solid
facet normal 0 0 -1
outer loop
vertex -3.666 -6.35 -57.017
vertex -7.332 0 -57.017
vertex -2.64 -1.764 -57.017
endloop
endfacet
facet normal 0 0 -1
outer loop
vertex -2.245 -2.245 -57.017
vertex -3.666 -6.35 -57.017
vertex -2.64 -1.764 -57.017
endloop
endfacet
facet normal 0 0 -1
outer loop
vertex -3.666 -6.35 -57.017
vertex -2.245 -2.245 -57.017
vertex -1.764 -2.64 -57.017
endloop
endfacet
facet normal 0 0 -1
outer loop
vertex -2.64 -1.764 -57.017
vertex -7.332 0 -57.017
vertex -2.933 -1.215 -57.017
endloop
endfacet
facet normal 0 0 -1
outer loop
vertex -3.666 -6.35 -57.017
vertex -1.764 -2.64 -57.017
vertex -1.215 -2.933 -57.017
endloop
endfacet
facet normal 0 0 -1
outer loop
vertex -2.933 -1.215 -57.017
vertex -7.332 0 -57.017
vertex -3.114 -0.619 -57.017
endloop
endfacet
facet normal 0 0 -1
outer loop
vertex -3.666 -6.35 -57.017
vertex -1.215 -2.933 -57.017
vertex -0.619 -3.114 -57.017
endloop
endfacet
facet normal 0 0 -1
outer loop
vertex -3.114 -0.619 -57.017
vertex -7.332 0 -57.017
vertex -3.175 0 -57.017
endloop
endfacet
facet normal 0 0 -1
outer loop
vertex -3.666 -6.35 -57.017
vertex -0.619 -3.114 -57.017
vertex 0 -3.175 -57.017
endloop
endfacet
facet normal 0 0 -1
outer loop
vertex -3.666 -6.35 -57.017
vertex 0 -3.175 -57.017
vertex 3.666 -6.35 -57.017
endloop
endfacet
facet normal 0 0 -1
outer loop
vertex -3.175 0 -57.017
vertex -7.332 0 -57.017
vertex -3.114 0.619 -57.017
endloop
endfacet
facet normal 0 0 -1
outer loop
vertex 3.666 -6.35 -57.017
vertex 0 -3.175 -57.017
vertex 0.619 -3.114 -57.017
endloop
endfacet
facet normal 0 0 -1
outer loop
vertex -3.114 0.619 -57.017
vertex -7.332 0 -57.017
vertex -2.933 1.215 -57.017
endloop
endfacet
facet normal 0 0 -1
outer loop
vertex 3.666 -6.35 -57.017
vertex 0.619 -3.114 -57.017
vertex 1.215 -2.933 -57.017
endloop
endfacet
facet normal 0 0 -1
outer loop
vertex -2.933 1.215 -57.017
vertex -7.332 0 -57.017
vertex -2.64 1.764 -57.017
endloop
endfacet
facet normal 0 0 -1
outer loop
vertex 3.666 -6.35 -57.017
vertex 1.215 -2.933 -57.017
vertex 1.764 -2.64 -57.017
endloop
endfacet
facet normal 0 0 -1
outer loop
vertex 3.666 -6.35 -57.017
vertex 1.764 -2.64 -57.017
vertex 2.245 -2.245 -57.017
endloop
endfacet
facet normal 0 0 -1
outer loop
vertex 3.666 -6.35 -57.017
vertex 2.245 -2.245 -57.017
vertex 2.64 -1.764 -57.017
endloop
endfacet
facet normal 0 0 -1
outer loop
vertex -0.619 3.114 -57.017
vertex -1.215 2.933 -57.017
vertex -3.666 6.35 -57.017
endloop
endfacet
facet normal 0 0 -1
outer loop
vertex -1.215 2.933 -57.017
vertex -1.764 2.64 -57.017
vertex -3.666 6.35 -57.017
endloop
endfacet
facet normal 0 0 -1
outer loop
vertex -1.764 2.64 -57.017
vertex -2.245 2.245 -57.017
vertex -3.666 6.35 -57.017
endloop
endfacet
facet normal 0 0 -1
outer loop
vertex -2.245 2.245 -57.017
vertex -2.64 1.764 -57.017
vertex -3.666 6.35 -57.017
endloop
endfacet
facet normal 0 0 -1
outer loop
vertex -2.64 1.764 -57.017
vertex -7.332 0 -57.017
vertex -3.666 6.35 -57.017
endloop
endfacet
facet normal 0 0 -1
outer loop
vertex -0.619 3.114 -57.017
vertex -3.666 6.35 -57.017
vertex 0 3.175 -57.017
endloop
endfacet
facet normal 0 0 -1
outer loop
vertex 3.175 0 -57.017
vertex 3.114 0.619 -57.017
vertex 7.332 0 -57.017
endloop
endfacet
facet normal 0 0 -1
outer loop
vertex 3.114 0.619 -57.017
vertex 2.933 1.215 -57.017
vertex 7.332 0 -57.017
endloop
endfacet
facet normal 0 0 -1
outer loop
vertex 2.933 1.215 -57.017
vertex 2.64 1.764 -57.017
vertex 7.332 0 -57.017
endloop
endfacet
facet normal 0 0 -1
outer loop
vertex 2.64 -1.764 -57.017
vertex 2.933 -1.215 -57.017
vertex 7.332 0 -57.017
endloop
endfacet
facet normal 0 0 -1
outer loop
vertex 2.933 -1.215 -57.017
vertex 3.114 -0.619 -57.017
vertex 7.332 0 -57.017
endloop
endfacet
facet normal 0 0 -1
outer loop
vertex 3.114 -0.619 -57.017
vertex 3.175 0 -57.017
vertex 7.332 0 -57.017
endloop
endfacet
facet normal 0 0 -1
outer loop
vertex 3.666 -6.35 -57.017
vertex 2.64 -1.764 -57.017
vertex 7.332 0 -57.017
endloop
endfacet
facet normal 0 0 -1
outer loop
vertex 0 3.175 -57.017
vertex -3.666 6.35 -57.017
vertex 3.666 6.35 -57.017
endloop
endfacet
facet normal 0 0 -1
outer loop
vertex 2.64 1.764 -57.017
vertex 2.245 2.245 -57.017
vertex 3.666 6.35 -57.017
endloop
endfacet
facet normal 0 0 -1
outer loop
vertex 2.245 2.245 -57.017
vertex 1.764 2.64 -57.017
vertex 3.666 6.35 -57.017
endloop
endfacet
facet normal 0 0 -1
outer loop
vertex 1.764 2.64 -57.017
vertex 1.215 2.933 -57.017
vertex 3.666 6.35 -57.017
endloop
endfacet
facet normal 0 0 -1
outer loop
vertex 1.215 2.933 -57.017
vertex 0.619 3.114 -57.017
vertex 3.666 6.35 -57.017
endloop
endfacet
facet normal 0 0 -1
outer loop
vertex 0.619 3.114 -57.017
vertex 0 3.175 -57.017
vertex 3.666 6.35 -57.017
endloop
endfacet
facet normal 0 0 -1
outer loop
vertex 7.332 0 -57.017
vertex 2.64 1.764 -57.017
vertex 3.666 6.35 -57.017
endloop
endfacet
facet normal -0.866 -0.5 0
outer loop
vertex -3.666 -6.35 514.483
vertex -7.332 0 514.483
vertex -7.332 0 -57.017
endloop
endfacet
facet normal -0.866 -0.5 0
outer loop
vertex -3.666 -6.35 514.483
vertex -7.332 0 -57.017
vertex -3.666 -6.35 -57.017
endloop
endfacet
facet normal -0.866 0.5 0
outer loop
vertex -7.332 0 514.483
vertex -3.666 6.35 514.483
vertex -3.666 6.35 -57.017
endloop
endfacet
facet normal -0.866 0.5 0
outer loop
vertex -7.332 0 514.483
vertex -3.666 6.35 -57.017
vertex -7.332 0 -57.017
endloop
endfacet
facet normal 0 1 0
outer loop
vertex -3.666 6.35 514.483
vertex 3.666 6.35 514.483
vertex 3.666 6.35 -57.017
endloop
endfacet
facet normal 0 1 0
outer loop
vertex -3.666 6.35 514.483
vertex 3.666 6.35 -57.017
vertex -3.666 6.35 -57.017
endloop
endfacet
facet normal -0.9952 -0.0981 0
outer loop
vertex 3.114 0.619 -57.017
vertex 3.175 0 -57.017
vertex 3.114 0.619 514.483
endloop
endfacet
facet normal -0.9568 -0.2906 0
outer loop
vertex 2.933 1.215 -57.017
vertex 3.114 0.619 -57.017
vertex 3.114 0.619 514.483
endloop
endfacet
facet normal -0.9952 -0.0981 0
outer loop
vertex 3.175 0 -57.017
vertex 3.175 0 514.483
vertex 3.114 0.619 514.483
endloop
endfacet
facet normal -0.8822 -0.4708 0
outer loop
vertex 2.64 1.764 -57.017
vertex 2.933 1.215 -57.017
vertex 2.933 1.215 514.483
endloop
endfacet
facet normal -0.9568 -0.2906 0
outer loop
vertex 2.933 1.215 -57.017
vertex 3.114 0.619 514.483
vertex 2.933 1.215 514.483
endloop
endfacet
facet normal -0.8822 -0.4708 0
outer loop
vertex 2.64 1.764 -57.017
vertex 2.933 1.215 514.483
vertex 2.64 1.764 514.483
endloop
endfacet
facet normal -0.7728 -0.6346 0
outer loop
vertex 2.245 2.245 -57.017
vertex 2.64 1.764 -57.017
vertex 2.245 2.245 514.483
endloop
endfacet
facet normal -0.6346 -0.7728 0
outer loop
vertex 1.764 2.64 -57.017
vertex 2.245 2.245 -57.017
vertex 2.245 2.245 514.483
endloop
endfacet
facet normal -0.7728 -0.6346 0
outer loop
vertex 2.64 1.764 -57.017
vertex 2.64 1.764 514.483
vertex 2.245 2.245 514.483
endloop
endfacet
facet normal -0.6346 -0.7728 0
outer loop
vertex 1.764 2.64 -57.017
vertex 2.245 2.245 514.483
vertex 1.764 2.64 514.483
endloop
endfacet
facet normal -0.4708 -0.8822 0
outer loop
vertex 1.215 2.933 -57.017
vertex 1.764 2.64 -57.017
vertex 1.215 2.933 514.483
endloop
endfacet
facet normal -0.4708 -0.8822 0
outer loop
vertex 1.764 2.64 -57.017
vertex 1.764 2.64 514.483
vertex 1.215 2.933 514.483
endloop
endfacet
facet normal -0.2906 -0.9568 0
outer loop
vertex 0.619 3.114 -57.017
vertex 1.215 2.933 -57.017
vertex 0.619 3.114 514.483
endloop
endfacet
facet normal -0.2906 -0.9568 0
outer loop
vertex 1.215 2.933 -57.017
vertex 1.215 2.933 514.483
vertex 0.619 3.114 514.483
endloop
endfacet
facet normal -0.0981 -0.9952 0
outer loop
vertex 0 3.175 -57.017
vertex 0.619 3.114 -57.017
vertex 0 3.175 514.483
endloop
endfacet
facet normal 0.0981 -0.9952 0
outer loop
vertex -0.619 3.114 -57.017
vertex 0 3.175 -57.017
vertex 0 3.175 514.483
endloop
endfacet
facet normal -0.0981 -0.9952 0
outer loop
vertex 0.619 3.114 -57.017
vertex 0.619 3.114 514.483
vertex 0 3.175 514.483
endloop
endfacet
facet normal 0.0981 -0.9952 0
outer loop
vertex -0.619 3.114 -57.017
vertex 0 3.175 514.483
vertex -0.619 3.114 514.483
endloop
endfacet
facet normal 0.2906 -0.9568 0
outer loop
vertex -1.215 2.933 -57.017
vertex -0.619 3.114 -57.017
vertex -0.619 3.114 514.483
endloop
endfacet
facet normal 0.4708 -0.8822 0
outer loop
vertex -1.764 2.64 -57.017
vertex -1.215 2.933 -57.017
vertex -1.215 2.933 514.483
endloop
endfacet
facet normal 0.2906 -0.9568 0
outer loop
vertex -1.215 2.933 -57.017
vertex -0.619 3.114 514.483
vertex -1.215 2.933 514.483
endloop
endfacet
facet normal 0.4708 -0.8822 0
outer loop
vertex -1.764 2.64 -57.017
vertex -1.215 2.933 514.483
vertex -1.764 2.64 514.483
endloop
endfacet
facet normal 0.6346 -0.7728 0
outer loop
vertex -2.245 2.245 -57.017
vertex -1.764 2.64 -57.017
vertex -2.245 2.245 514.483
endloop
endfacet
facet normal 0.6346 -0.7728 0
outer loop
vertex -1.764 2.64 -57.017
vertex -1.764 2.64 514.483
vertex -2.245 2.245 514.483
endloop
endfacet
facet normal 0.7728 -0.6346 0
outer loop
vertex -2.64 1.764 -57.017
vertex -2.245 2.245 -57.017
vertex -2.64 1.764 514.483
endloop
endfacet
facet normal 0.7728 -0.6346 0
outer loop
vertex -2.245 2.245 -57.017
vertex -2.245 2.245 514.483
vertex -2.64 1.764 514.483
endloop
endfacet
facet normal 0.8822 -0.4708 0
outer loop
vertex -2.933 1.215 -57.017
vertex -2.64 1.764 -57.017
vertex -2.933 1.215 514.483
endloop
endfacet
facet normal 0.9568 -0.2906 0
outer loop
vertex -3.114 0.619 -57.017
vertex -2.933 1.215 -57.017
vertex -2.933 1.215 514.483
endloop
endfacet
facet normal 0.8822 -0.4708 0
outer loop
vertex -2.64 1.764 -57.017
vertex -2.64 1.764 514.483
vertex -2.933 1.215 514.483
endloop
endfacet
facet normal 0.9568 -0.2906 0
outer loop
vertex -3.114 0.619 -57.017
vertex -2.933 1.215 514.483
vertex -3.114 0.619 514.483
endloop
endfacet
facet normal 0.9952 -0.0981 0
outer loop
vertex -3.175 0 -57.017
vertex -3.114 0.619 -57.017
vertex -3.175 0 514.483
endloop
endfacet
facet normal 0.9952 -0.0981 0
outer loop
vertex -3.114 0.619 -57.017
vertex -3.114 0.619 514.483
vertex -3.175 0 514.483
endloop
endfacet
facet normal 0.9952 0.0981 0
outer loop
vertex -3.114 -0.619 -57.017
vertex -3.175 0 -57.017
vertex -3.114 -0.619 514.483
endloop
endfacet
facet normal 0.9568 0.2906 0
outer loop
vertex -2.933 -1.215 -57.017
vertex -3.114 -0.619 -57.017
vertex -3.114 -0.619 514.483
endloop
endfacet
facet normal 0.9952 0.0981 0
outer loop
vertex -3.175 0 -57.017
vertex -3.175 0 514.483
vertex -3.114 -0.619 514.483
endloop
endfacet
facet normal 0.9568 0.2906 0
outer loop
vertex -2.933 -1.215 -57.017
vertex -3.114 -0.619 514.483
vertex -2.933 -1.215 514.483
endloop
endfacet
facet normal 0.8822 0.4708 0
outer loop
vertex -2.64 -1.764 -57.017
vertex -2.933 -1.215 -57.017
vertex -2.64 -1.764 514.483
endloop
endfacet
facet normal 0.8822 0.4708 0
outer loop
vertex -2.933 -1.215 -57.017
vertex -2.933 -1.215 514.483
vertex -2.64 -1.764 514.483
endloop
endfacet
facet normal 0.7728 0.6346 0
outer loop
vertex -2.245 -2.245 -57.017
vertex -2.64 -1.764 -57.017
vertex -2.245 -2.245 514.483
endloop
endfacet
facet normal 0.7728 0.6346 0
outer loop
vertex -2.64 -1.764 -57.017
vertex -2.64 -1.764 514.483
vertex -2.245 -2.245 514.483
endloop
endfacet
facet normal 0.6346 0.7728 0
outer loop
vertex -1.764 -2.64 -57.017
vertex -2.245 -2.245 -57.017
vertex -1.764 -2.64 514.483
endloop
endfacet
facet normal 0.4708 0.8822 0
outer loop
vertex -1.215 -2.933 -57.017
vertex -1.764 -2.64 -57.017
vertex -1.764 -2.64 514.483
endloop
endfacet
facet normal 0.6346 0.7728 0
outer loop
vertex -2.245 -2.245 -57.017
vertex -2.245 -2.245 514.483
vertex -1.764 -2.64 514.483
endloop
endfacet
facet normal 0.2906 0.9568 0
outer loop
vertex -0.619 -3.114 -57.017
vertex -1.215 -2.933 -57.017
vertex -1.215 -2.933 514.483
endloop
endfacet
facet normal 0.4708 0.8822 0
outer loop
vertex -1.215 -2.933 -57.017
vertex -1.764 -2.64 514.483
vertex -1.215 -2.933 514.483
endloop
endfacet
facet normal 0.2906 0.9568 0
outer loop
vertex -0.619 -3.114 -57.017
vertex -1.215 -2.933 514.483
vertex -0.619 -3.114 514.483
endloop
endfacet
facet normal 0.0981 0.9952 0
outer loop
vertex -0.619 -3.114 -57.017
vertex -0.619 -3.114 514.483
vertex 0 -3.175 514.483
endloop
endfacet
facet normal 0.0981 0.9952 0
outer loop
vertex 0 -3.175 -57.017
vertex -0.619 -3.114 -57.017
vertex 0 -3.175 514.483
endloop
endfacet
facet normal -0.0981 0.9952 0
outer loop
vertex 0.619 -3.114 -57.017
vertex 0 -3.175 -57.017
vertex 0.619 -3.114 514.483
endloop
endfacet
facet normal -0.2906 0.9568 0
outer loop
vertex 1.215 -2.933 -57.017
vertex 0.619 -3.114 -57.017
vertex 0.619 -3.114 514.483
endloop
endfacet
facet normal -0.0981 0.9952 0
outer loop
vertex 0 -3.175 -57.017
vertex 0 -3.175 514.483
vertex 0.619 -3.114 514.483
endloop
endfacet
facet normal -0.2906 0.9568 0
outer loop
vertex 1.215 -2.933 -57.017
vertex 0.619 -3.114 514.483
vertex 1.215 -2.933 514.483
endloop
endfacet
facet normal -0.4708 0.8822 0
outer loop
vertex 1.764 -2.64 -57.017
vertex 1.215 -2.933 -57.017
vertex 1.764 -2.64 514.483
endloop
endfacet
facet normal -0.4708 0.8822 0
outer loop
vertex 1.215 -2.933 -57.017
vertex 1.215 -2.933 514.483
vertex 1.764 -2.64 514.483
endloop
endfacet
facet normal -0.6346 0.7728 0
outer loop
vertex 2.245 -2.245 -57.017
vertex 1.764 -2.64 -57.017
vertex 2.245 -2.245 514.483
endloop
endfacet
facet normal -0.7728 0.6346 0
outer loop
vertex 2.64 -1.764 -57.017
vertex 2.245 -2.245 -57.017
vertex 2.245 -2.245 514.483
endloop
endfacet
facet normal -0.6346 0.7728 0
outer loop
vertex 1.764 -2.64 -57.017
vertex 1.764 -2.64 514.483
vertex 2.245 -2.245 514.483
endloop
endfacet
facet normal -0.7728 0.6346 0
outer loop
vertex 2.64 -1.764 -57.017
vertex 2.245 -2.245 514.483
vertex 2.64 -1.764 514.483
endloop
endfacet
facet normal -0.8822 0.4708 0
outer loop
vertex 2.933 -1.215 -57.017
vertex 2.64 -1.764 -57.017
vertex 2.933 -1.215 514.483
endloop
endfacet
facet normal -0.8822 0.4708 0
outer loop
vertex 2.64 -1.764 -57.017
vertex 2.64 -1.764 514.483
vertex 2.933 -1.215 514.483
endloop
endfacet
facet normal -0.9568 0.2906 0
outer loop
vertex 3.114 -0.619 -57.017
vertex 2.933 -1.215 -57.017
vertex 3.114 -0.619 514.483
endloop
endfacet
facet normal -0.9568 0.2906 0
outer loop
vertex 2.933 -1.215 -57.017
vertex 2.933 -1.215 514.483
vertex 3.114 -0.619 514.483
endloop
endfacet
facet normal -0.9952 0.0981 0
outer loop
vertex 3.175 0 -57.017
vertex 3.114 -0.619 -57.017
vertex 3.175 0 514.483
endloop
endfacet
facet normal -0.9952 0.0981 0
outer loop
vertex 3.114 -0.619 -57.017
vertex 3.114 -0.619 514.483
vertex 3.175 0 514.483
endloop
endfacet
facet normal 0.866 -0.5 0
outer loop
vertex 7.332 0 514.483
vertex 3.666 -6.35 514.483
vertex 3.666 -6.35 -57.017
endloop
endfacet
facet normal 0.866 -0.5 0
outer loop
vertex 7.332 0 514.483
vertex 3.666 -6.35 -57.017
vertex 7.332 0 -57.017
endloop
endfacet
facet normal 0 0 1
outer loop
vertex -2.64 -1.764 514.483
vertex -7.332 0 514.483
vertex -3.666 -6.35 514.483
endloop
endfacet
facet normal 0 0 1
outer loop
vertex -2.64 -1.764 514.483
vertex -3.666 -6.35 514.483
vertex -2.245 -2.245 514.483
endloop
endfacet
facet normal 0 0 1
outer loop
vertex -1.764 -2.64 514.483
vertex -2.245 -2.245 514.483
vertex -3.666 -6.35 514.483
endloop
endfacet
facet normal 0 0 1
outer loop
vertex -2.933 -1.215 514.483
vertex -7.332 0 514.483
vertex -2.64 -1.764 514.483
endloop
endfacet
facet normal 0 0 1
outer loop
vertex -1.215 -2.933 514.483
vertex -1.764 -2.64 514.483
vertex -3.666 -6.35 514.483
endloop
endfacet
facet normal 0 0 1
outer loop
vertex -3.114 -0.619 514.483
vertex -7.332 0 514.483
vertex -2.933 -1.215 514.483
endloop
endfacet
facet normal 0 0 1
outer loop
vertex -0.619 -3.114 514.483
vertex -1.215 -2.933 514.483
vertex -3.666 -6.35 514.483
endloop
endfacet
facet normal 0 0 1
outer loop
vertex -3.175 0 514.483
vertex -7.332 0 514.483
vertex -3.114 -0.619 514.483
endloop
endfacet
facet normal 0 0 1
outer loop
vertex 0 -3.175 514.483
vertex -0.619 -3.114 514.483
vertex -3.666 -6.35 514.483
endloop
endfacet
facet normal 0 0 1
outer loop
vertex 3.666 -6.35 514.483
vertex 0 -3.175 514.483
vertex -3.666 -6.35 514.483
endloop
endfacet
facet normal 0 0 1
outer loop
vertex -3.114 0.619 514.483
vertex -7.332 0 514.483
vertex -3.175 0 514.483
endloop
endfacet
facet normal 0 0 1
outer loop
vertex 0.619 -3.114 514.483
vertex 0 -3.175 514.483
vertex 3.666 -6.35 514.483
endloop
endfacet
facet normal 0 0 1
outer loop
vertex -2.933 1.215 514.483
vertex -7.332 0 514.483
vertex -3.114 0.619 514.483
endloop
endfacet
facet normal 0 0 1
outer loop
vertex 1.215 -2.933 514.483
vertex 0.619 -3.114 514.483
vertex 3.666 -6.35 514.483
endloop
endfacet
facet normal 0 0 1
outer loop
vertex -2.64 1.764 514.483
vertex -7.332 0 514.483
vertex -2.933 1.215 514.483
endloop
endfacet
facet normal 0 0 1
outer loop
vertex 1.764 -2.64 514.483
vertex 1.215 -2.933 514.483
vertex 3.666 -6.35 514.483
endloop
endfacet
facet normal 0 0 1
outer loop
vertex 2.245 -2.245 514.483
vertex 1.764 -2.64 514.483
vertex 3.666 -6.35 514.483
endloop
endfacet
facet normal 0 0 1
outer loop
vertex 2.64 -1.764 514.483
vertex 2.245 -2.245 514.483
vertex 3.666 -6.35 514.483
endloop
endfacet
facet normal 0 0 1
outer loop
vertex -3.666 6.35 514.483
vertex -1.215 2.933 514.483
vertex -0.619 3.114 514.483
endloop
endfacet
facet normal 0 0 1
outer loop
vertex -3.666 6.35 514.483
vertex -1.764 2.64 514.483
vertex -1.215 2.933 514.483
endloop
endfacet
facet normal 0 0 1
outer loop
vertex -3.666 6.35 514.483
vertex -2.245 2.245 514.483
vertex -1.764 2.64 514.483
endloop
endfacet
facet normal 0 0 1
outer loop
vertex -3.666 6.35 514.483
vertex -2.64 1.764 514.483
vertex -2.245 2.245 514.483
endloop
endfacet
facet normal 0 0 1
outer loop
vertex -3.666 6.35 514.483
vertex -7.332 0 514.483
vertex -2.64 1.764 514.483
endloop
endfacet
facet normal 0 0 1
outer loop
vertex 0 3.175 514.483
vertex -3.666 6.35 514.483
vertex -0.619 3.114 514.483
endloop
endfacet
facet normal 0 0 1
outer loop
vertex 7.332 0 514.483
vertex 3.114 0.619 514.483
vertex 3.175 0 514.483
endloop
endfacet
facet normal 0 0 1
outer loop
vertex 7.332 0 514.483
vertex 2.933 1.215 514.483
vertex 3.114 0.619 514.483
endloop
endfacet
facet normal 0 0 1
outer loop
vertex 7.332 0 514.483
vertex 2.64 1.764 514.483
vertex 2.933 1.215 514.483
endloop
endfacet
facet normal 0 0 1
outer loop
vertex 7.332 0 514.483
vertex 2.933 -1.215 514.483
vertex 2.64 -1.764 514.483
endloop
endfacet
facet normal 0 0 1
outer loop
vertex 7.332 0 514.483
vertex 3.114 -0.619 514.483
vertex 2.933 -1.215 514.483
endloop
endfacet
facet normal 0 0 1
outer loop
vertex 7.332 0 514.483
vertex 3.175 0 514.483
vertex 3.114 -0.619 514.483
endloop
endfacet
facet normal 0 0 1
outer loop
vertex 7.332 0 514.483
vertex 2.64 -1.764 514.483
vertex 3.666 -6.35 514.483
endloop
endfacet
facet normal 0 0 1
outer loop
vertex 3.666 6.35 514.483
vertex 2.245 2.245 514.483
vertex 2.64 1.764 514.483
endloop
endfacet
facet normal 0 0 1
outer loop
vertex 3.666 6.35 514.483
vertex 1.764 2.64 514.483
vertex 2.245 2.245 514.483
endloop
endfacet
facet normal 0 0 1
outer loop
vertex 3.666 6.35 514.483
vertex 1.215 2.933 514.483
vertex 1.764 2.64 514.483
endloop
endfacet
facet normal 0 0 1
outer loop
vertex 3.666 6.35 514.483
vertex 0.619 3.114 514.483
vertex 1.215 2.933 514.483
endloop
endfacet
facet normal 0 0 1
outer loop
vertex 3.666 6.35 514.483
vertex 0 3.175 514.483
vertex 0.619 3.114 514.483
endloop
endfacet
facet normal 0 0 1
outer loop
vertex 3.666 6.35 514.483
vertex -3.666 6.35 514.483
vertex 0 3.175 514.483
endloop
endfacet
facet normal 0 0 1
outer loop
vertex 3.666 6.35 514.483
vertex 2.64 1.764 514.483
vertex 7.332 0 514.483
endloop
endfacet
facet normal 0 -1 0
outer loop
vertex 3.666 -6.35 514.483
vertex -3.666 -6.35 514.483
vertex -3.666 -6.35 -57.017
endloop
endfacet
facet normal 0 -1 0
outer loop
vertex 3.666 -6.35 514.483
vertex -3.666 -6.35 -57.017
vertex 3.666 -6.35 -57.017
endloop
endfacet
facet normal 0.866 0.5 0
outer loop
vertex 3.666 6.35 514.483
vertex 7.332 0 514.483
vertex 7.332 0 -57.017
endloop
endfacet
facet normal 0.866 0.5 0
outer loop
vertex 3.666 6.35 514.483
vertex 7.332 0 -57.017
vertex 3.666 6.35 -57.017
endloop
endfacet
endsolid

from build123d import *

# Parameters (mm, degrees)
BOSS_EXTRUDE1_DEPTH     = 514.48335
SKETCH2_R               = 3.175
CUT_EXTRUDE1_DEPTH      = 1
CUT_EXTRUDE1_DEPTH_BACK = 515.48335
SKETCH3_R               = 3.175
BOSS_EXTRUDE2_DEPTH     = 571.5


with BuildPart() as part:
    # Sketch1 → Boss-Extrude1 (new body)
    with BuildSketch(Plane.XY):
        Polygon((-7.332348419, 0), (-3.666174209, -6.35), (3.666174209, -6.35), (7.332348419, 0), (3.666174209, 6.35), (-3.666174209, 6.35), align=None)
    extrude(amount=BOSS_EXTRUDE1_DEPTH)

    # Sketch2 → Cut-Extrude1 (cut, two sides)
    with BuildSketch(Plane.XY.offset(514.48335)) as cut_extrude1_sk:
        Circle(SKETCH2_R)
    extrude(amount=CUT_EXTRUDE1_DEPTH, mode=Mode.SUBTRACT)
    extrude(cut_extrude1_sk.sketch, amount=-CUT_EXTRUDE1_DEPTH_BACK, mode=Mode.SUBTRACT)

    # Sketch3 → Boss-Extrude2 (add)
    with BuildSketch(Plane.XY.offset(514.48335)):
        Polygon((-3.666174209, -6.35), (3.666174209, -6.35), (7.332348419, 0), (3.666174209, 6.35), (-3.666174209, 6.35), (-7.332348419, 0), align=None)
        Circle(SKETCH3_R, mode=Mode.SUBTRACT)
    extrude(amount=-BOSS_EXTRUDE2_DEPTH)


solid = part.part
